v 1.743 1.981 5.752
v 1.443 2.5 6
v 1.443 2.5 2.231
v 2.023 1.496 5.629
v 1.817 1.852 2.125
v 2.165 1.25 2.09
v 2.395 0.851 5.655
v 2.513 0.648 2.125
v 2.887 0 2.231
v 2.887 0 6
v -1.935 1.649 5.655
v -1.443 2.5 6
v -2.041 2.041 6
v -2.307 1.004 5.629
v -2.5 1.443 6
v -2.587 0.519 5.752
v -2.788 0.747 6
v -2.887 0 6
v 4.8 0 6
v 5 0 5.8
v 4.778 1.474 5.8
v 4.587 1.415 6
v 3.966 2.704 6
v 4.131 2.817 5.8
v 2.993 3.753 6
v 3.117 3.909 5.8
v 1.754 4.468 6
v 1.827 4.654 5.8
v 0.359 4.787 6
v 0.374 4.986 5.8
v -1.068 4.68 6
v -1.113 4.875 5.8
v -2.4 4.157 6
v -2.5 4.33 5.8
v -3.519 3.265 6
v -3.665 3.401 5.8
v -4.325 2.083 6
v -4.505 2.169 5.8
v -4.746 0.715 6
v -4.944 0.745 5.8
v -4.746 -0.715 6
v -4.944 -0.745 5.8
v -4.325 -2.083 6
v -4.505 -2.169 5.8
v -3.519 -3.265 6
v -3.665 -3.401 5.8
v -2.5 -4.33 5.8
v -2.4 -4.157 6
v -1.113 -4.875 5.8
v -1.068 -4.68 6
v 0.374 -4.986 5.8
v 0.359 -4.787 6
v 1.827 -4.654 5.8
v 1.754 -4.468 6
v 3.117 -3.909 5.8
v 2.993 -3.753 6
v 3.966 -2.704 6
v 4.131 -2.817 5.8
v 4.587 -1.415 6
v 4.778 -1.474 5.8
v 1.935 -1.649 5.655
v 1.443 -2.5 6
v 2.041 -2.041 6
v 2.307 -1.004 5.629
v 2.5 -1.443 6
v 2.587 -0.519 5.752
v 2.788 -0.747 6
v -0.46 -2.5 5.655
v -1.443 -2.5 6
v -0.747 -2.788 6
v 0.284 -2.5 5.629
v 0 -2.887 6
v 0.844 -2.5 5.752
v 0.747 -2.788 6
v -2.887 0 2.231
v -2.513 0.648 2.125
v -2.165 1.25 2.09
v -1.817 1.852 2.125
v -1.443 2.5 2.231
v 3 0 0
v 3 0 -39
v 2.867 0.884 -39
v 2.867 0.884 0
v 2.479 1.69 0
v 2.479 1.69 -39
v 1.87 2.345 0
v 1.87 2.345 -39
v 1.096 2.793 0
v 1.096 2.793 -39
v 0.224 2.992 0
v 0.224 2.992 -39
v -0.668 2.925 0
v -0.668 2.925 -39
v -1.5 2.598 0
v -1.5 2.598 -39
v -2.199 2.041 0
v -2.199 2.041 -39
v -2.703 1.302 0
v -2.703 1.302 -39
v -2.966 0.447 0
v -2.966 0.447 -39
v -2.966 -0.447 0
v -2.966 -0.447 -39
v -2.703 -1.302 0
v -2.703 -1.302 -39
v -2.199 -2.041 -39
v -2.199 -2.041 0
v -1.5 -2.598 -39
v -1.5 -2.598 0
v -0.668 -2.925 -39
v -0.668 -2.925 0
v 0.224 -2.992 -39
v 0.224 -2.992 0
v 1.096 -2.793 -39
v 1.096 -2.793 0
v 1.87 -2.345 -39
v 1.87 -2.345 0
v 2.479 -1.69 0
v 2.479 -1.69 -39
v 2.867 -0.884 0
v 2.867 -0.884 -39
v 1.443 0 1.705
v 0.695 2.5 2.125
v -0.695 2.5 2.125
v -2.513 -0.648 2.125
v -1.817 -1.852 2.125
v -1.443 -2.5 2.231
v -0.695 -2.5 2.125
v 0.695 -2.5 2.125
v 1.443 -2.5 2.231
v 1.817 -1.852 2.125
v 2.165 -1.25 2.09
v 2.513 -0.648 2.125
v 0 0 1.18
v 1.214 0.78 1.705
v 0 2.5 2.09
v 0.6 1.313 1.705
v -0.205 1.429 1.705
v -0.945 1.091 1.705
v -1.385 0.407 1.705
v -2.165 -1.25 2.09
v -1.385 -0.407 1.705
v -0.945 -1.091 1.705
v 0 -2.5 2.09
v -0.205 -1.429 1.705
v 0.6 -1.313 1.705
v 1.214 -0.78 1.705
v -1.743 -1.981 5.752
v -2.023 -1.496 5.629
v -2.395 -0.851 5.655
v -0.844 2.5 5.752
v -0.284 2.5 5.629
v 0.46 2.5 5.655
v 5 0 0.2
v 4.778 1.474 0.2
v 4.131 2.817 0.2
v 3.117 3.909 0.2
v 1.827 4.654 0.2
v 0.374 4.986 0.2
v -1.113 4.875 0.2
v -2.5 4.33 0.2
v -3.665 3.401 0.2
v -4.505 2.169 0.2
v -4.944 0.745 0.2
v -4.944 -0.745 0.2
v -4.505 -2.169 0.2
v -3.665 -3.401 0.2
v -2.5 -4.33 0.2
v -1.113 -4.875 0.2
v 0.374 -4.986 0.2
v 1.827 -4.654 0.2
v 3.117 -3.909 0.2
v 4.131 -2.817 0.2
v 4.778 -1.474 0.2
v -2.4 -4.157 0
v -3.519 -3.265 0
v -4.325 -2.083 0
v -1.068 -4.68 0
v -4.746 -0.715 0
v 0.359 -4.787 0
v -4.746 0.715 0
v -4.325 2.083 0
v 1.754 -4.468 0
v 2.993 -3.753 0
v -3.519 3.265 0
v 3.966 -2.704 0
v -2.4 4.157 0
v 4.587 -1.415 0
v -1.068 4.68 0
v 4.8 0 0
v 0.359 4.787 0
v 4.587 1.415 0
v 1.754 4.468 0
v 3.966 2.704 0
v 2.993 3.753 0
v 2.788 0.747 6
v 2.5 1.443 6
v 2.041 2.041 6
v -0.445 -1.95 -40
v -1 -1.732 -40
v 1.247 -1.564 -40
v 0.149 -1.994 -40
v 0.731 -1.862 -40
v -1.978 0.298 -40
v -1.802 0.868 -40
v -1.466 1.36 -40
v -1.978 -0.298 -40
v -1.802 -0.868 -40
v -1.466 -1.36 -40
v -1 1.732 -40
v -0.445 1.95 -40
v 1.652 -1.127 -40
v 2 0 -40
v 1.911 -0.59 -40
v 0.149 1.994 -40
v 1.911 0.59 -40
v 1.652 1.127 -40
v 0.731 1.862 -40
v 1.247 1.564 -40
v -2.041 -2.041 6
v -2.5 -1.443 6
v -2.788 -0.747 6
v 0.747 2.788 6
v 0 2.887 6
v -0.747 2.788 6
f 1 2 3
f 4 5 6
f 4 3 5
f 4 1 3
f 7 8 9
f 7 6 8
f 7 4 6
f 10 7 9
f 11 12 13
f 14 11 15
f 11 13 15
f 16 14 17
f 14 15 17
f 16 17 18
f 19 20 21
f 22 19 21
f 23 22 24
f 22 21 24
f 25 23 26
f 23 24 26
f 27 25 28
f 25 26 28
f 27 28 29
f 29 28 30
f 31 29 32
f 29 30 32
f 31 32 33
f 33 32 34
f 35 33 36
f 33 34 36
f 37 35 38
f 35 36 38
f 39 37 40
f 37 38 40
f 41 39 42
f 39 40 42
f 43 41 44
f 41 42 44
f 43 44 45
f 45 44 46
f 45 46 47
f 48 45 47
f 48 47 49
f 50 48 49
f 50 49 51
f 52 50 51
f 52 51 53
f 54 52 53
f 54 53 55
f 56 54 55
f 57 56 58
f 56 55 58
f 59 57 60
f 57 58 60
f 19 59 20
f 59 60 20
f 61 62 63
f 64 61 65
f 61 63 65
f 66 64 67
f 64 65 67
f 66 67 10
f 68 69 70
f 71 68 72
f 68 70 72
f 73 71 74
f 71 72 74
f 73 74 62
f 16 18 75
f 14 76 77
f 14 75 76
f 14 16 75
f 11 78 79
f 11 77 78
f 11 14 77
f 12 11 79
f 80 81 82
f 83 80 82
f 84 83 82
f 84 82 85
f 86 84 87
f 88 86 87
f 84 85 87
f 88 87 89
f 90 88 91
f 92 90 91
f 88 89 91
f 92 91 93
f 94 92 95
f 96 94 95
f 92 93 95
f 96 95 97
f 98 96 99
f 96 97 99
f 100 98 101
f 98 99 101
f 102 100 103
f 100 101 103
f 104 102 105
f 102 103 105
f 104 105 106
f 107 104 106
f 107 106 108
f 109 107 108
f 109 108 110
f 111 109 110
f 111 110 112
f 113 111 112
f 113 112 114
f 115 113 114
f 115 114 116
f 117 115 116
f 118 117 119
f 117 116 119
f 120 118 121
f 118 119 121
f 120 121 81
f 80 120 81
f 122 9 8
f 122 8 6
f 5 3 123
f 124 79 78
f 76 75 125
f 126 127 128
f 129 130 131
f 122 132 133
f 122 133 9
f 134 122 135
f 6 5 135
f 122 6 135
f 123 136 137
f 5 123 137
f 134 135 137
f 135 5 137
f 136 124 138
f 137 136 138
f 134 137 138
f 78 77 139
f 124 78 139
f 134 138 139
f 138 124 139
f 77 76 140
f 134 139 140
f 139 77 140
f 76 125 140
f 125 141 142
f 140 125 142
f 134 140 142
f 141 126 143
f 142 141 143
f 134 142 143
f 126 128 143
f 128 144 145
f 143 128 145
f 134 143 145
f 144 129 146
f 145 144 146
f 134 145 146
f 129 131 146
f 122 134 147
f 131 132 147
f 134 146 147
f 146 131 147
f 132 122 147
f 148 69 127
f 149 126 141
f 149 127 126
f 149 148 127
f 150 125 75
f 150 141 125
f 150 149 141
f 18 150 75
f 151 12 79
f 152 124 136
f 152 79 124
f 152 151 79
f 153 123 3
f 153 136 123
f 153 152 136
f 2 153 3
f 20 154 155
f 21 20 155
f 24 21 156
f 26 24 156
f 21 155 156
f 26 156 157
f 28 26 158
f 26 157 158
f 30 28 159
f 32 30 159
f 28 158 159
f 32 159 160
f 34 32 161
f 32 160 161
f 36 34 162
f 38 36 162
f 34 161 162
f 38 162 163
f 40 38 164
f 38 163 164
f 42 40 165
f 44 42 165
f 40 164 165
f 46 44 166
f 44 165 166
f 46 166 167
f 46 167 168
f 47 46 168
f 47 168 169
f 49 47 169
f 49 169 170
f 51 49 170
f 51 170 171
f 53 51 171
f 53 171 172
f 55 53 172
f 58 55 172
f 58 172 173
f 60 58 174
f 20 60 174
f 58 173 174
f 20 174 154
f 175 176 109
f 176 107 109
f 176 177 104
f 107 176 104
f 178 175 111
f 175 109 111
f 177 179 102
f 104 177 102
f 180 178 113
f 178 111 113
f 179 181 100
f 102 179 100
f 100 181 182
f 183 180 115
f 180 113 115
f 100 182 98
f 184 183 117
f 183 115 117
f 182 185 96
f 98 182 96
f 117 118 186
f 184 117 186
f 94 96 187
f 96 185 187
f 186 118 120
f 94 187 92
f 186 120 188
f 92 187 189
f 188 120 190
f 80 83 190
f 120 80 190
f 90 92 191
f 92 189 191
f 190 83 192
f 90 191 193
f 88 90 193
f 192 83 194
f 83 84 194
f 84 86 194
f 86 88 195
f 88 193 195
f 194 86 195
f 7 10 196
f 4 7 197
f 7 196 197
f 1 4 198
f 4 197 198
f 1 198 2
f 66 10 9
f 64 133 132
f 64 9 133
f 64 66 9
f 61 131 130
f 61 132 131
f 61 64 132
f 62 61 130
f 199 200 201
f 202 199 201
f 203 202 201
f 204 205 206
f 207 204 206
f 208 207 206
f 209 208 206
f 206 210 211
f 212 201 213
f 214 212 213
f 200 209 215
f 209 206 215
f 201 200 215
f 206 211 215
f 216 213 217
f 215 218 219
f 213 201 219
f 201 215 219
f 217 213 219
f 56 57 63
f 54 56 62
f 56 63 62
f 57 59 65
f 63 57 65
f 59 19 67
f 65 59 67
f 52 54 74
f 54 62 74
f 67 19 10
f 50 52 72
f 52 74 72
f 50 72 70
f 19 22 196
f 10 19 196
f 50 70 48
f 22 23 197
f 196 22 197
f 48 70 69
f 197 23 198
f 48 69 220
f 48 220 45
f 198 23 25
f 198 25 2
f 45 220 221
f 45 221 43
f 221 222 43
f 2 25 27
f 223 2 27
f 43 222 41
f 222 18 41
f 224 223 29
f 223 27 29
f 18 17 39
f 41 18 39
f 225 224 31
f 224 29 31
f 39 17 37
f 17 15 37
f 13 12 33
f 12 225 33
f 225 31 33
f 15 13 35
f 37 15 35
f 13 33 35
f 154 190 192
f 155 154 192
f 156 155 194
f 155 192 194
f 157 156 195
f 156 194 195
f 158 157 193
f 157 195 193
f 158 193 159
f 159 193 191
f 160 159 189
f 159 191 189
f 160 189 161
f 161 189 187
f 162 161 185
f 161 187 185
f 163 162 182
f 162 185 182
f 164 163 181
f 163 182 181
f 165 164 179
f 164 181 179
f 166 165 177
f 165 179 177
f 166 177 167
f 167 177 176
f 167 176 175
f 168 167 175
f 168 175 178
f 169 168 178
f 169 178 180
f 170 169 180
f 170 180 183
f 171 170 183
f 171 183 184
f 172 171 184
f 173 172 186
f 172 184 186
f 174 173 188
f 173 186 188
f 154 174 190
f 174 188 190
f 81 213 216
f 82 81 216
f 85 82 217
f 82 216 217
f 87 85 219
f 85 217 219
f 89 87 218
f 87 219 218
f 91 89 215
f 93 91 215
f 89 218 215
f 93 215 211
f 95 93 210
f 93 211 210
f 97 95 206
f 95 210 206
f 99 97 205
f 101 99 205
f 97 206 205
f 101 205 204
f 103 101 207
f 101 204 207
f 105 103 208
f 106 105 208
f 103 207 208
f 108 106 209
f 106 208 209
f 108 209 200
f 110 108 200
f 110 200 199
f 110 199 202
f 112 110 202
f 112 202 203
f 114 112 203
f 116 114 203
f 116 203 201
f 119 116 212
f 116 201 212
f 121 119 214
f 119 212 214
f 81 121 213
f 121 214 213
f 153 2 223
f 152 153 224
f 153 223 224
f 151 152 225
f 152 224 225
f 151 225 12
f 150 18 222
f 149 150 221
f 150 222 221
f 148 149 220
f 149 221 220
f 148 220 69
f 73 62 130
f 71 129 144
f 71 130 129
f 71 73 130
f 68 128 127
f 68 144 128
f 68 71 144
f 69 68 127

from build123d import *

# Parameters (mm, degrees)
SKETCH001_R     = 6
POCKET_DEPTH    = 8.820854
CHAMFER_SIZE    = 0.2
CHAMFER001_SIZE = 1


with BuildPart() as pocket:
    # Sketch003 → Revolution001 (revolve)
    with BuildSketch(Plane.XZ):
        Polygon((0, 1.180146), (5, 3), (5, 10), (0, 10), align=None)
    revolve(axis=Axis((0, 0, 0), (0, 0, 1)))

    # Sketch001 → Pocket (cut, through all)
    with BuildSketch(Plane(origin=(0, 0, 10), x_dir=(-1, 0, 0), z_dir=(0, 0, 1))):
        Circle(SKETCH001_R)
        Polygon((-1.443376, 2.5), (1.443376, 2.5), (2.886751, 0), (1.443376, -2.5), (-1.443376, -2.5), (-2.886751, 0), align=None, mode=Mode.SUBTRACT)
    extrude(amount=-POCKET_DEPTH, mode=Mode.SUBTRACT)


with BuildPart() as chamfer001:
    # Sketch → Revolution (revolve)
    with BuildSketch(Plane.XZ):
        Polygon((2.88675, 6), (5, 6), (5, 0), (3, 0), (3, -40), (0, -40), (0, 3.113247), align=None)
    revolve(axis=Axis((0, 0, 0), (0, 0, 1)))

    # Cut: cut Pocket
    add(pocket.part, mode=Mode.SUBTRACT)

    # Chamfer
    chamfer_edges = [chamfer001.edges().sort_by_distance(p)[0] for p in [
        (-5, 0, 6),
        (-5, 0, 0),
    ]]
    chamfer(chamfer_edges, length=CHAMFER_SIZE)

    # Chamfer001
    chamfer001_edges = [chamfer001.edges().sort_by_distance(p)[0] for p in [
        (-3, 0, -40),
    ]]
    chamfer(chamfer001_edges, length=CHAMFER001_SIZE)


solid = chamfer001.part
